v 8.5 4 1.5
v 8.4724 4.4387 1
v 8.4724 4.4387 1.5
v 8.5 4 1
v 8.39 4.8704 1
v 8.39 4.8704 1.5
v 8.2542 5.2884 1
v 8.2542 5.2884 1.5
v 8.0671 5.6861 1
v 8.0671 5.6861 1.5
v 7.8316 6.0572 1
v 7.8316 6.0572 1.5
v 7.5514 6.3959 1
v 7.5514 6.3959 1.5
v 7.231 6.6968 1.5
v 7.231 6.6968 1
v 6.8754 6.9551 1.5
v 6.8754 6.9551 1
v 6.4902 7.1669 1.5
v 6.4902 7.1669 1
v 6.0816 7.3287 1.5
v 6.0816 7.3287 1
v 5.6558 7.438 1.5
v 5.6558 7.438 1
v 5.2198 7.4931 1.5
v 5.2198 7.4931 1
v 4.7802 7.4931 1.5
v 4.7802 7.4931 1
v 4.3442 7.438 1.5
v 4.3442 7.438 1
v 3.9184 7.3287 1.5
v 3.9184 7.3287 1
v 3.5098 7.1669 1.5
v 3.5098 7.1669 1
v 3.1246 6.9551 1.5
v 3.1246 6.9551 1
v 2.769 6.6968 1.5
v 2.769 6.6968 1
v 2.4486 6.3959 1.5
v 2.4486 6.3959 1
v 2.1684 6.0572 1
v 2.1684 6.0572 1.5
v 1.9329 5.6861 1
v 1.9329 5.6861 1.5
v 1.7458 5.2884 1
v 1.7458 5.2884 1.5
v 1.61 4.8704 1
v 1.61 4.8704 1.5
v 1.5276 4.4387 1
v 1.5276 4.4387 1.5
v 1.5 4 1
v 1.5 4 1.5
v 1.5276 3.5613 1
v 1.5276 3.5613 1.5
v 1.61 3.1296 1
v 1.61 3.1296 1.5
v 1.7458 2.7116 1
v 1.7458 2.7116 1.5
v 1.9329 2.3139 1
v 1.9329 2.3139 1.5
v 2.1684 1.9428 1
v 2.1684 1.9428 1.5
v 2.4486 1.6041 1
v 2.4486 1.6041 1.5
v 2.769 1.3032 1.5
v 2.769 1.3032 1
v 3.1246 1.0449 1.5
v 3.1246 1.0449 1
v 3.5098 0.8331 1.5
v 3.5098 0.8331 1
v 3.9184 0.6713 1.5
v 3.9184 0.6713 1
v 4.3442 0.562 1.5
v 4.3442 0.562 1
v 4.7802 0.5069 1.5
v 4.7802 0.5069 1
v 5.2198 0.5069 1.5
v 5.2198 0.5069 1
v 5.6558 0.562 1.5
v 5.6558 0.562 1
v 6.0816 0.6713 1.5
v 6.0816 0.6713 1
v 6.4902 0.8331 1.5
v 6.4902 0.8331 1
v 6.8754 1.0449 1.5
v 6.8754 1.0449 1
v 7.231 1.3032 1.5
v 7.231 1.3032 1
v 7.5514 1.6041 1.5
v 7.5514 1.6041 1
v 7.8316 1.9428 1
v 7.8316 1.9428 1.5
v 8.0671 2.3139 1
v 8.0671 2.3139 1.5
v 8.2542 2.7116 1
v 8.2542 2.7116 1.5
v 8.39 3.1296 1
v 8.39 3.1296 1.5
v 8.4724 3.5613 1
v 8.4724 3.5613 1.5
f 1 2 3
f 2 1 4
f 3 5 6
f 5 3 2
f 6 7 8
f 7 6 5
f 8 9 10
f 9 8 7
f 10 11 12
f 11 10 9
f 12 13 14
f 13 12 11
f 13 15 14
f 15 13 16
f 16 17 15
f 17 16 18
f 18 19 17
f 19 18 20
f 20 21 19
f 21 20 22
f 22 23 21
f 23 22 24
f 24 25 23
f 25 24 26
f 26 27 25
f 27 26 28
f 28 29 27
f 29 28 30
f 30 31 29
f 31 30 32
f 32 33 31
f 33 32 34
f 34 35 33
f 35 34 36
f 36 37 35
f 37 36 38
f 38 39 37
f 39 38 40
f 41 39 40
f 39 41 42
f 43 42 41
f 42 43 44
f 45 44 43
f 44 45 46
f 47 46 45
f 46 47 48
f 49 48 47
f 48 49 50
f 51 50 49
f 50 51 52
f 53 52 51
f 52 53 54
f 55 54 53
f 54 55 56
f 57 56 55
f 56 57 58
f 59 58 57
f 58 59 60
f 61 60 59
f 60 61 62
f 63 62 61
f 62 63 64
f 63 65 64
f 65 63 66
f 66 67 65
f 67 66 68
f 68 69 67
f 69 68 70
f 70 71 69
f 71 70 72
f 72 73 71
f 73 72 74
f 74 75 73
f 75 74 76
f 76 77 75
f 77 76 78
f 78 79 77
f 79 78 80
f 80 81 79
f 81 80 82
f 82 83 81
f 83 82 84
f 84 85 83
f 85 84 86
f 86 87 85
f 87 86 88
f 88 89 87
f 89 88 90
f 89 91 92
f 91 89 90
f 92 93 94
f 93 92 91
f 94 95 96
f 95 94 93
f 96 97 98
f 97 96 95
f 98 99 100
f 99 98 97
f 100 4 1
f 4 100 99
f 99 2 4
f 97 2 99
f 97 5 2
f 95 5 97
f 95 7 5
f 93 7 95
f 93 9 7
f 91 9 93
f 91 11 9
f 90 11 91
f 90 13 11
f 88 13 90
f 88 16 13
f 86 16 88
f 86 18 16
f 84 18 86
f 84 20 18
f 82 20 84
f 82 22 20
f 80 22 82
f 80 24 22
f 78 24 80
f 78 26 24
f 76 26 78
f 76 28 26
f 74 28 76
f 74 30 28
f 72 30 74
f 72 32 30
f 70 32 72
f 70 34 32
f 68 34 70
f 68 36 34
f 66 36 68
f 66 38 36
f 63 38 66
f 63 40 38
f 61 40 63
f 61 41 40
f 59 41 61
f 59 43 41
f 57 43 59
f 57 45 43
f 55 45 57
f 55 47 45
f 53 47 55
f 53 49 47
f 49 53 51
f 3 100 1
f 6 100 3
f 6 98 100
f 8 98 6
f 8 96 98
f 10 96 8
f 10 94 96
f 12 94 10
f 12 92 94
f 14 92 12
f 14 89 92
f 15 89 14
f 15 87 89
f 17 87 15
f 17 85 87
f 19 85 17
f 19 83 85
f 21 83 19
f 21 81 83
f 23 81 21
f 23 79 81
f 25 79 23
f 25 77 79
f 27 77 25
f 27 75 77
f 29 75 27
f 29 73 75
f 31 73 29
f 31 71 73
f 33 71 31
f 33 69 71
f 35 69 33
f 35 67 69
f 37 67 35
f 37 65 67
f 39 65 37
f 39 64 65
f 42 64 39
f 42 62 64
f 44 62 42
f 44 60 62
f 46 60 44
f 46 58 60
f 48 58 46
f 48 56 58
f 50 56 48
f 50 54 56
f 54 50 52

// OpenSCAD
module inner(){
	translate([1,1,0])
		cube([6,7,1]);
	cube([8,6,1]);
}

module box(){
	difference(){
		cube([10,6,3]);

		translate([1,-1,1])
			inner();
	}
}

% box();

color("red")
	translate([5,4,1])
		cylinder(h=0.5, r=3.5, $fn=50);
